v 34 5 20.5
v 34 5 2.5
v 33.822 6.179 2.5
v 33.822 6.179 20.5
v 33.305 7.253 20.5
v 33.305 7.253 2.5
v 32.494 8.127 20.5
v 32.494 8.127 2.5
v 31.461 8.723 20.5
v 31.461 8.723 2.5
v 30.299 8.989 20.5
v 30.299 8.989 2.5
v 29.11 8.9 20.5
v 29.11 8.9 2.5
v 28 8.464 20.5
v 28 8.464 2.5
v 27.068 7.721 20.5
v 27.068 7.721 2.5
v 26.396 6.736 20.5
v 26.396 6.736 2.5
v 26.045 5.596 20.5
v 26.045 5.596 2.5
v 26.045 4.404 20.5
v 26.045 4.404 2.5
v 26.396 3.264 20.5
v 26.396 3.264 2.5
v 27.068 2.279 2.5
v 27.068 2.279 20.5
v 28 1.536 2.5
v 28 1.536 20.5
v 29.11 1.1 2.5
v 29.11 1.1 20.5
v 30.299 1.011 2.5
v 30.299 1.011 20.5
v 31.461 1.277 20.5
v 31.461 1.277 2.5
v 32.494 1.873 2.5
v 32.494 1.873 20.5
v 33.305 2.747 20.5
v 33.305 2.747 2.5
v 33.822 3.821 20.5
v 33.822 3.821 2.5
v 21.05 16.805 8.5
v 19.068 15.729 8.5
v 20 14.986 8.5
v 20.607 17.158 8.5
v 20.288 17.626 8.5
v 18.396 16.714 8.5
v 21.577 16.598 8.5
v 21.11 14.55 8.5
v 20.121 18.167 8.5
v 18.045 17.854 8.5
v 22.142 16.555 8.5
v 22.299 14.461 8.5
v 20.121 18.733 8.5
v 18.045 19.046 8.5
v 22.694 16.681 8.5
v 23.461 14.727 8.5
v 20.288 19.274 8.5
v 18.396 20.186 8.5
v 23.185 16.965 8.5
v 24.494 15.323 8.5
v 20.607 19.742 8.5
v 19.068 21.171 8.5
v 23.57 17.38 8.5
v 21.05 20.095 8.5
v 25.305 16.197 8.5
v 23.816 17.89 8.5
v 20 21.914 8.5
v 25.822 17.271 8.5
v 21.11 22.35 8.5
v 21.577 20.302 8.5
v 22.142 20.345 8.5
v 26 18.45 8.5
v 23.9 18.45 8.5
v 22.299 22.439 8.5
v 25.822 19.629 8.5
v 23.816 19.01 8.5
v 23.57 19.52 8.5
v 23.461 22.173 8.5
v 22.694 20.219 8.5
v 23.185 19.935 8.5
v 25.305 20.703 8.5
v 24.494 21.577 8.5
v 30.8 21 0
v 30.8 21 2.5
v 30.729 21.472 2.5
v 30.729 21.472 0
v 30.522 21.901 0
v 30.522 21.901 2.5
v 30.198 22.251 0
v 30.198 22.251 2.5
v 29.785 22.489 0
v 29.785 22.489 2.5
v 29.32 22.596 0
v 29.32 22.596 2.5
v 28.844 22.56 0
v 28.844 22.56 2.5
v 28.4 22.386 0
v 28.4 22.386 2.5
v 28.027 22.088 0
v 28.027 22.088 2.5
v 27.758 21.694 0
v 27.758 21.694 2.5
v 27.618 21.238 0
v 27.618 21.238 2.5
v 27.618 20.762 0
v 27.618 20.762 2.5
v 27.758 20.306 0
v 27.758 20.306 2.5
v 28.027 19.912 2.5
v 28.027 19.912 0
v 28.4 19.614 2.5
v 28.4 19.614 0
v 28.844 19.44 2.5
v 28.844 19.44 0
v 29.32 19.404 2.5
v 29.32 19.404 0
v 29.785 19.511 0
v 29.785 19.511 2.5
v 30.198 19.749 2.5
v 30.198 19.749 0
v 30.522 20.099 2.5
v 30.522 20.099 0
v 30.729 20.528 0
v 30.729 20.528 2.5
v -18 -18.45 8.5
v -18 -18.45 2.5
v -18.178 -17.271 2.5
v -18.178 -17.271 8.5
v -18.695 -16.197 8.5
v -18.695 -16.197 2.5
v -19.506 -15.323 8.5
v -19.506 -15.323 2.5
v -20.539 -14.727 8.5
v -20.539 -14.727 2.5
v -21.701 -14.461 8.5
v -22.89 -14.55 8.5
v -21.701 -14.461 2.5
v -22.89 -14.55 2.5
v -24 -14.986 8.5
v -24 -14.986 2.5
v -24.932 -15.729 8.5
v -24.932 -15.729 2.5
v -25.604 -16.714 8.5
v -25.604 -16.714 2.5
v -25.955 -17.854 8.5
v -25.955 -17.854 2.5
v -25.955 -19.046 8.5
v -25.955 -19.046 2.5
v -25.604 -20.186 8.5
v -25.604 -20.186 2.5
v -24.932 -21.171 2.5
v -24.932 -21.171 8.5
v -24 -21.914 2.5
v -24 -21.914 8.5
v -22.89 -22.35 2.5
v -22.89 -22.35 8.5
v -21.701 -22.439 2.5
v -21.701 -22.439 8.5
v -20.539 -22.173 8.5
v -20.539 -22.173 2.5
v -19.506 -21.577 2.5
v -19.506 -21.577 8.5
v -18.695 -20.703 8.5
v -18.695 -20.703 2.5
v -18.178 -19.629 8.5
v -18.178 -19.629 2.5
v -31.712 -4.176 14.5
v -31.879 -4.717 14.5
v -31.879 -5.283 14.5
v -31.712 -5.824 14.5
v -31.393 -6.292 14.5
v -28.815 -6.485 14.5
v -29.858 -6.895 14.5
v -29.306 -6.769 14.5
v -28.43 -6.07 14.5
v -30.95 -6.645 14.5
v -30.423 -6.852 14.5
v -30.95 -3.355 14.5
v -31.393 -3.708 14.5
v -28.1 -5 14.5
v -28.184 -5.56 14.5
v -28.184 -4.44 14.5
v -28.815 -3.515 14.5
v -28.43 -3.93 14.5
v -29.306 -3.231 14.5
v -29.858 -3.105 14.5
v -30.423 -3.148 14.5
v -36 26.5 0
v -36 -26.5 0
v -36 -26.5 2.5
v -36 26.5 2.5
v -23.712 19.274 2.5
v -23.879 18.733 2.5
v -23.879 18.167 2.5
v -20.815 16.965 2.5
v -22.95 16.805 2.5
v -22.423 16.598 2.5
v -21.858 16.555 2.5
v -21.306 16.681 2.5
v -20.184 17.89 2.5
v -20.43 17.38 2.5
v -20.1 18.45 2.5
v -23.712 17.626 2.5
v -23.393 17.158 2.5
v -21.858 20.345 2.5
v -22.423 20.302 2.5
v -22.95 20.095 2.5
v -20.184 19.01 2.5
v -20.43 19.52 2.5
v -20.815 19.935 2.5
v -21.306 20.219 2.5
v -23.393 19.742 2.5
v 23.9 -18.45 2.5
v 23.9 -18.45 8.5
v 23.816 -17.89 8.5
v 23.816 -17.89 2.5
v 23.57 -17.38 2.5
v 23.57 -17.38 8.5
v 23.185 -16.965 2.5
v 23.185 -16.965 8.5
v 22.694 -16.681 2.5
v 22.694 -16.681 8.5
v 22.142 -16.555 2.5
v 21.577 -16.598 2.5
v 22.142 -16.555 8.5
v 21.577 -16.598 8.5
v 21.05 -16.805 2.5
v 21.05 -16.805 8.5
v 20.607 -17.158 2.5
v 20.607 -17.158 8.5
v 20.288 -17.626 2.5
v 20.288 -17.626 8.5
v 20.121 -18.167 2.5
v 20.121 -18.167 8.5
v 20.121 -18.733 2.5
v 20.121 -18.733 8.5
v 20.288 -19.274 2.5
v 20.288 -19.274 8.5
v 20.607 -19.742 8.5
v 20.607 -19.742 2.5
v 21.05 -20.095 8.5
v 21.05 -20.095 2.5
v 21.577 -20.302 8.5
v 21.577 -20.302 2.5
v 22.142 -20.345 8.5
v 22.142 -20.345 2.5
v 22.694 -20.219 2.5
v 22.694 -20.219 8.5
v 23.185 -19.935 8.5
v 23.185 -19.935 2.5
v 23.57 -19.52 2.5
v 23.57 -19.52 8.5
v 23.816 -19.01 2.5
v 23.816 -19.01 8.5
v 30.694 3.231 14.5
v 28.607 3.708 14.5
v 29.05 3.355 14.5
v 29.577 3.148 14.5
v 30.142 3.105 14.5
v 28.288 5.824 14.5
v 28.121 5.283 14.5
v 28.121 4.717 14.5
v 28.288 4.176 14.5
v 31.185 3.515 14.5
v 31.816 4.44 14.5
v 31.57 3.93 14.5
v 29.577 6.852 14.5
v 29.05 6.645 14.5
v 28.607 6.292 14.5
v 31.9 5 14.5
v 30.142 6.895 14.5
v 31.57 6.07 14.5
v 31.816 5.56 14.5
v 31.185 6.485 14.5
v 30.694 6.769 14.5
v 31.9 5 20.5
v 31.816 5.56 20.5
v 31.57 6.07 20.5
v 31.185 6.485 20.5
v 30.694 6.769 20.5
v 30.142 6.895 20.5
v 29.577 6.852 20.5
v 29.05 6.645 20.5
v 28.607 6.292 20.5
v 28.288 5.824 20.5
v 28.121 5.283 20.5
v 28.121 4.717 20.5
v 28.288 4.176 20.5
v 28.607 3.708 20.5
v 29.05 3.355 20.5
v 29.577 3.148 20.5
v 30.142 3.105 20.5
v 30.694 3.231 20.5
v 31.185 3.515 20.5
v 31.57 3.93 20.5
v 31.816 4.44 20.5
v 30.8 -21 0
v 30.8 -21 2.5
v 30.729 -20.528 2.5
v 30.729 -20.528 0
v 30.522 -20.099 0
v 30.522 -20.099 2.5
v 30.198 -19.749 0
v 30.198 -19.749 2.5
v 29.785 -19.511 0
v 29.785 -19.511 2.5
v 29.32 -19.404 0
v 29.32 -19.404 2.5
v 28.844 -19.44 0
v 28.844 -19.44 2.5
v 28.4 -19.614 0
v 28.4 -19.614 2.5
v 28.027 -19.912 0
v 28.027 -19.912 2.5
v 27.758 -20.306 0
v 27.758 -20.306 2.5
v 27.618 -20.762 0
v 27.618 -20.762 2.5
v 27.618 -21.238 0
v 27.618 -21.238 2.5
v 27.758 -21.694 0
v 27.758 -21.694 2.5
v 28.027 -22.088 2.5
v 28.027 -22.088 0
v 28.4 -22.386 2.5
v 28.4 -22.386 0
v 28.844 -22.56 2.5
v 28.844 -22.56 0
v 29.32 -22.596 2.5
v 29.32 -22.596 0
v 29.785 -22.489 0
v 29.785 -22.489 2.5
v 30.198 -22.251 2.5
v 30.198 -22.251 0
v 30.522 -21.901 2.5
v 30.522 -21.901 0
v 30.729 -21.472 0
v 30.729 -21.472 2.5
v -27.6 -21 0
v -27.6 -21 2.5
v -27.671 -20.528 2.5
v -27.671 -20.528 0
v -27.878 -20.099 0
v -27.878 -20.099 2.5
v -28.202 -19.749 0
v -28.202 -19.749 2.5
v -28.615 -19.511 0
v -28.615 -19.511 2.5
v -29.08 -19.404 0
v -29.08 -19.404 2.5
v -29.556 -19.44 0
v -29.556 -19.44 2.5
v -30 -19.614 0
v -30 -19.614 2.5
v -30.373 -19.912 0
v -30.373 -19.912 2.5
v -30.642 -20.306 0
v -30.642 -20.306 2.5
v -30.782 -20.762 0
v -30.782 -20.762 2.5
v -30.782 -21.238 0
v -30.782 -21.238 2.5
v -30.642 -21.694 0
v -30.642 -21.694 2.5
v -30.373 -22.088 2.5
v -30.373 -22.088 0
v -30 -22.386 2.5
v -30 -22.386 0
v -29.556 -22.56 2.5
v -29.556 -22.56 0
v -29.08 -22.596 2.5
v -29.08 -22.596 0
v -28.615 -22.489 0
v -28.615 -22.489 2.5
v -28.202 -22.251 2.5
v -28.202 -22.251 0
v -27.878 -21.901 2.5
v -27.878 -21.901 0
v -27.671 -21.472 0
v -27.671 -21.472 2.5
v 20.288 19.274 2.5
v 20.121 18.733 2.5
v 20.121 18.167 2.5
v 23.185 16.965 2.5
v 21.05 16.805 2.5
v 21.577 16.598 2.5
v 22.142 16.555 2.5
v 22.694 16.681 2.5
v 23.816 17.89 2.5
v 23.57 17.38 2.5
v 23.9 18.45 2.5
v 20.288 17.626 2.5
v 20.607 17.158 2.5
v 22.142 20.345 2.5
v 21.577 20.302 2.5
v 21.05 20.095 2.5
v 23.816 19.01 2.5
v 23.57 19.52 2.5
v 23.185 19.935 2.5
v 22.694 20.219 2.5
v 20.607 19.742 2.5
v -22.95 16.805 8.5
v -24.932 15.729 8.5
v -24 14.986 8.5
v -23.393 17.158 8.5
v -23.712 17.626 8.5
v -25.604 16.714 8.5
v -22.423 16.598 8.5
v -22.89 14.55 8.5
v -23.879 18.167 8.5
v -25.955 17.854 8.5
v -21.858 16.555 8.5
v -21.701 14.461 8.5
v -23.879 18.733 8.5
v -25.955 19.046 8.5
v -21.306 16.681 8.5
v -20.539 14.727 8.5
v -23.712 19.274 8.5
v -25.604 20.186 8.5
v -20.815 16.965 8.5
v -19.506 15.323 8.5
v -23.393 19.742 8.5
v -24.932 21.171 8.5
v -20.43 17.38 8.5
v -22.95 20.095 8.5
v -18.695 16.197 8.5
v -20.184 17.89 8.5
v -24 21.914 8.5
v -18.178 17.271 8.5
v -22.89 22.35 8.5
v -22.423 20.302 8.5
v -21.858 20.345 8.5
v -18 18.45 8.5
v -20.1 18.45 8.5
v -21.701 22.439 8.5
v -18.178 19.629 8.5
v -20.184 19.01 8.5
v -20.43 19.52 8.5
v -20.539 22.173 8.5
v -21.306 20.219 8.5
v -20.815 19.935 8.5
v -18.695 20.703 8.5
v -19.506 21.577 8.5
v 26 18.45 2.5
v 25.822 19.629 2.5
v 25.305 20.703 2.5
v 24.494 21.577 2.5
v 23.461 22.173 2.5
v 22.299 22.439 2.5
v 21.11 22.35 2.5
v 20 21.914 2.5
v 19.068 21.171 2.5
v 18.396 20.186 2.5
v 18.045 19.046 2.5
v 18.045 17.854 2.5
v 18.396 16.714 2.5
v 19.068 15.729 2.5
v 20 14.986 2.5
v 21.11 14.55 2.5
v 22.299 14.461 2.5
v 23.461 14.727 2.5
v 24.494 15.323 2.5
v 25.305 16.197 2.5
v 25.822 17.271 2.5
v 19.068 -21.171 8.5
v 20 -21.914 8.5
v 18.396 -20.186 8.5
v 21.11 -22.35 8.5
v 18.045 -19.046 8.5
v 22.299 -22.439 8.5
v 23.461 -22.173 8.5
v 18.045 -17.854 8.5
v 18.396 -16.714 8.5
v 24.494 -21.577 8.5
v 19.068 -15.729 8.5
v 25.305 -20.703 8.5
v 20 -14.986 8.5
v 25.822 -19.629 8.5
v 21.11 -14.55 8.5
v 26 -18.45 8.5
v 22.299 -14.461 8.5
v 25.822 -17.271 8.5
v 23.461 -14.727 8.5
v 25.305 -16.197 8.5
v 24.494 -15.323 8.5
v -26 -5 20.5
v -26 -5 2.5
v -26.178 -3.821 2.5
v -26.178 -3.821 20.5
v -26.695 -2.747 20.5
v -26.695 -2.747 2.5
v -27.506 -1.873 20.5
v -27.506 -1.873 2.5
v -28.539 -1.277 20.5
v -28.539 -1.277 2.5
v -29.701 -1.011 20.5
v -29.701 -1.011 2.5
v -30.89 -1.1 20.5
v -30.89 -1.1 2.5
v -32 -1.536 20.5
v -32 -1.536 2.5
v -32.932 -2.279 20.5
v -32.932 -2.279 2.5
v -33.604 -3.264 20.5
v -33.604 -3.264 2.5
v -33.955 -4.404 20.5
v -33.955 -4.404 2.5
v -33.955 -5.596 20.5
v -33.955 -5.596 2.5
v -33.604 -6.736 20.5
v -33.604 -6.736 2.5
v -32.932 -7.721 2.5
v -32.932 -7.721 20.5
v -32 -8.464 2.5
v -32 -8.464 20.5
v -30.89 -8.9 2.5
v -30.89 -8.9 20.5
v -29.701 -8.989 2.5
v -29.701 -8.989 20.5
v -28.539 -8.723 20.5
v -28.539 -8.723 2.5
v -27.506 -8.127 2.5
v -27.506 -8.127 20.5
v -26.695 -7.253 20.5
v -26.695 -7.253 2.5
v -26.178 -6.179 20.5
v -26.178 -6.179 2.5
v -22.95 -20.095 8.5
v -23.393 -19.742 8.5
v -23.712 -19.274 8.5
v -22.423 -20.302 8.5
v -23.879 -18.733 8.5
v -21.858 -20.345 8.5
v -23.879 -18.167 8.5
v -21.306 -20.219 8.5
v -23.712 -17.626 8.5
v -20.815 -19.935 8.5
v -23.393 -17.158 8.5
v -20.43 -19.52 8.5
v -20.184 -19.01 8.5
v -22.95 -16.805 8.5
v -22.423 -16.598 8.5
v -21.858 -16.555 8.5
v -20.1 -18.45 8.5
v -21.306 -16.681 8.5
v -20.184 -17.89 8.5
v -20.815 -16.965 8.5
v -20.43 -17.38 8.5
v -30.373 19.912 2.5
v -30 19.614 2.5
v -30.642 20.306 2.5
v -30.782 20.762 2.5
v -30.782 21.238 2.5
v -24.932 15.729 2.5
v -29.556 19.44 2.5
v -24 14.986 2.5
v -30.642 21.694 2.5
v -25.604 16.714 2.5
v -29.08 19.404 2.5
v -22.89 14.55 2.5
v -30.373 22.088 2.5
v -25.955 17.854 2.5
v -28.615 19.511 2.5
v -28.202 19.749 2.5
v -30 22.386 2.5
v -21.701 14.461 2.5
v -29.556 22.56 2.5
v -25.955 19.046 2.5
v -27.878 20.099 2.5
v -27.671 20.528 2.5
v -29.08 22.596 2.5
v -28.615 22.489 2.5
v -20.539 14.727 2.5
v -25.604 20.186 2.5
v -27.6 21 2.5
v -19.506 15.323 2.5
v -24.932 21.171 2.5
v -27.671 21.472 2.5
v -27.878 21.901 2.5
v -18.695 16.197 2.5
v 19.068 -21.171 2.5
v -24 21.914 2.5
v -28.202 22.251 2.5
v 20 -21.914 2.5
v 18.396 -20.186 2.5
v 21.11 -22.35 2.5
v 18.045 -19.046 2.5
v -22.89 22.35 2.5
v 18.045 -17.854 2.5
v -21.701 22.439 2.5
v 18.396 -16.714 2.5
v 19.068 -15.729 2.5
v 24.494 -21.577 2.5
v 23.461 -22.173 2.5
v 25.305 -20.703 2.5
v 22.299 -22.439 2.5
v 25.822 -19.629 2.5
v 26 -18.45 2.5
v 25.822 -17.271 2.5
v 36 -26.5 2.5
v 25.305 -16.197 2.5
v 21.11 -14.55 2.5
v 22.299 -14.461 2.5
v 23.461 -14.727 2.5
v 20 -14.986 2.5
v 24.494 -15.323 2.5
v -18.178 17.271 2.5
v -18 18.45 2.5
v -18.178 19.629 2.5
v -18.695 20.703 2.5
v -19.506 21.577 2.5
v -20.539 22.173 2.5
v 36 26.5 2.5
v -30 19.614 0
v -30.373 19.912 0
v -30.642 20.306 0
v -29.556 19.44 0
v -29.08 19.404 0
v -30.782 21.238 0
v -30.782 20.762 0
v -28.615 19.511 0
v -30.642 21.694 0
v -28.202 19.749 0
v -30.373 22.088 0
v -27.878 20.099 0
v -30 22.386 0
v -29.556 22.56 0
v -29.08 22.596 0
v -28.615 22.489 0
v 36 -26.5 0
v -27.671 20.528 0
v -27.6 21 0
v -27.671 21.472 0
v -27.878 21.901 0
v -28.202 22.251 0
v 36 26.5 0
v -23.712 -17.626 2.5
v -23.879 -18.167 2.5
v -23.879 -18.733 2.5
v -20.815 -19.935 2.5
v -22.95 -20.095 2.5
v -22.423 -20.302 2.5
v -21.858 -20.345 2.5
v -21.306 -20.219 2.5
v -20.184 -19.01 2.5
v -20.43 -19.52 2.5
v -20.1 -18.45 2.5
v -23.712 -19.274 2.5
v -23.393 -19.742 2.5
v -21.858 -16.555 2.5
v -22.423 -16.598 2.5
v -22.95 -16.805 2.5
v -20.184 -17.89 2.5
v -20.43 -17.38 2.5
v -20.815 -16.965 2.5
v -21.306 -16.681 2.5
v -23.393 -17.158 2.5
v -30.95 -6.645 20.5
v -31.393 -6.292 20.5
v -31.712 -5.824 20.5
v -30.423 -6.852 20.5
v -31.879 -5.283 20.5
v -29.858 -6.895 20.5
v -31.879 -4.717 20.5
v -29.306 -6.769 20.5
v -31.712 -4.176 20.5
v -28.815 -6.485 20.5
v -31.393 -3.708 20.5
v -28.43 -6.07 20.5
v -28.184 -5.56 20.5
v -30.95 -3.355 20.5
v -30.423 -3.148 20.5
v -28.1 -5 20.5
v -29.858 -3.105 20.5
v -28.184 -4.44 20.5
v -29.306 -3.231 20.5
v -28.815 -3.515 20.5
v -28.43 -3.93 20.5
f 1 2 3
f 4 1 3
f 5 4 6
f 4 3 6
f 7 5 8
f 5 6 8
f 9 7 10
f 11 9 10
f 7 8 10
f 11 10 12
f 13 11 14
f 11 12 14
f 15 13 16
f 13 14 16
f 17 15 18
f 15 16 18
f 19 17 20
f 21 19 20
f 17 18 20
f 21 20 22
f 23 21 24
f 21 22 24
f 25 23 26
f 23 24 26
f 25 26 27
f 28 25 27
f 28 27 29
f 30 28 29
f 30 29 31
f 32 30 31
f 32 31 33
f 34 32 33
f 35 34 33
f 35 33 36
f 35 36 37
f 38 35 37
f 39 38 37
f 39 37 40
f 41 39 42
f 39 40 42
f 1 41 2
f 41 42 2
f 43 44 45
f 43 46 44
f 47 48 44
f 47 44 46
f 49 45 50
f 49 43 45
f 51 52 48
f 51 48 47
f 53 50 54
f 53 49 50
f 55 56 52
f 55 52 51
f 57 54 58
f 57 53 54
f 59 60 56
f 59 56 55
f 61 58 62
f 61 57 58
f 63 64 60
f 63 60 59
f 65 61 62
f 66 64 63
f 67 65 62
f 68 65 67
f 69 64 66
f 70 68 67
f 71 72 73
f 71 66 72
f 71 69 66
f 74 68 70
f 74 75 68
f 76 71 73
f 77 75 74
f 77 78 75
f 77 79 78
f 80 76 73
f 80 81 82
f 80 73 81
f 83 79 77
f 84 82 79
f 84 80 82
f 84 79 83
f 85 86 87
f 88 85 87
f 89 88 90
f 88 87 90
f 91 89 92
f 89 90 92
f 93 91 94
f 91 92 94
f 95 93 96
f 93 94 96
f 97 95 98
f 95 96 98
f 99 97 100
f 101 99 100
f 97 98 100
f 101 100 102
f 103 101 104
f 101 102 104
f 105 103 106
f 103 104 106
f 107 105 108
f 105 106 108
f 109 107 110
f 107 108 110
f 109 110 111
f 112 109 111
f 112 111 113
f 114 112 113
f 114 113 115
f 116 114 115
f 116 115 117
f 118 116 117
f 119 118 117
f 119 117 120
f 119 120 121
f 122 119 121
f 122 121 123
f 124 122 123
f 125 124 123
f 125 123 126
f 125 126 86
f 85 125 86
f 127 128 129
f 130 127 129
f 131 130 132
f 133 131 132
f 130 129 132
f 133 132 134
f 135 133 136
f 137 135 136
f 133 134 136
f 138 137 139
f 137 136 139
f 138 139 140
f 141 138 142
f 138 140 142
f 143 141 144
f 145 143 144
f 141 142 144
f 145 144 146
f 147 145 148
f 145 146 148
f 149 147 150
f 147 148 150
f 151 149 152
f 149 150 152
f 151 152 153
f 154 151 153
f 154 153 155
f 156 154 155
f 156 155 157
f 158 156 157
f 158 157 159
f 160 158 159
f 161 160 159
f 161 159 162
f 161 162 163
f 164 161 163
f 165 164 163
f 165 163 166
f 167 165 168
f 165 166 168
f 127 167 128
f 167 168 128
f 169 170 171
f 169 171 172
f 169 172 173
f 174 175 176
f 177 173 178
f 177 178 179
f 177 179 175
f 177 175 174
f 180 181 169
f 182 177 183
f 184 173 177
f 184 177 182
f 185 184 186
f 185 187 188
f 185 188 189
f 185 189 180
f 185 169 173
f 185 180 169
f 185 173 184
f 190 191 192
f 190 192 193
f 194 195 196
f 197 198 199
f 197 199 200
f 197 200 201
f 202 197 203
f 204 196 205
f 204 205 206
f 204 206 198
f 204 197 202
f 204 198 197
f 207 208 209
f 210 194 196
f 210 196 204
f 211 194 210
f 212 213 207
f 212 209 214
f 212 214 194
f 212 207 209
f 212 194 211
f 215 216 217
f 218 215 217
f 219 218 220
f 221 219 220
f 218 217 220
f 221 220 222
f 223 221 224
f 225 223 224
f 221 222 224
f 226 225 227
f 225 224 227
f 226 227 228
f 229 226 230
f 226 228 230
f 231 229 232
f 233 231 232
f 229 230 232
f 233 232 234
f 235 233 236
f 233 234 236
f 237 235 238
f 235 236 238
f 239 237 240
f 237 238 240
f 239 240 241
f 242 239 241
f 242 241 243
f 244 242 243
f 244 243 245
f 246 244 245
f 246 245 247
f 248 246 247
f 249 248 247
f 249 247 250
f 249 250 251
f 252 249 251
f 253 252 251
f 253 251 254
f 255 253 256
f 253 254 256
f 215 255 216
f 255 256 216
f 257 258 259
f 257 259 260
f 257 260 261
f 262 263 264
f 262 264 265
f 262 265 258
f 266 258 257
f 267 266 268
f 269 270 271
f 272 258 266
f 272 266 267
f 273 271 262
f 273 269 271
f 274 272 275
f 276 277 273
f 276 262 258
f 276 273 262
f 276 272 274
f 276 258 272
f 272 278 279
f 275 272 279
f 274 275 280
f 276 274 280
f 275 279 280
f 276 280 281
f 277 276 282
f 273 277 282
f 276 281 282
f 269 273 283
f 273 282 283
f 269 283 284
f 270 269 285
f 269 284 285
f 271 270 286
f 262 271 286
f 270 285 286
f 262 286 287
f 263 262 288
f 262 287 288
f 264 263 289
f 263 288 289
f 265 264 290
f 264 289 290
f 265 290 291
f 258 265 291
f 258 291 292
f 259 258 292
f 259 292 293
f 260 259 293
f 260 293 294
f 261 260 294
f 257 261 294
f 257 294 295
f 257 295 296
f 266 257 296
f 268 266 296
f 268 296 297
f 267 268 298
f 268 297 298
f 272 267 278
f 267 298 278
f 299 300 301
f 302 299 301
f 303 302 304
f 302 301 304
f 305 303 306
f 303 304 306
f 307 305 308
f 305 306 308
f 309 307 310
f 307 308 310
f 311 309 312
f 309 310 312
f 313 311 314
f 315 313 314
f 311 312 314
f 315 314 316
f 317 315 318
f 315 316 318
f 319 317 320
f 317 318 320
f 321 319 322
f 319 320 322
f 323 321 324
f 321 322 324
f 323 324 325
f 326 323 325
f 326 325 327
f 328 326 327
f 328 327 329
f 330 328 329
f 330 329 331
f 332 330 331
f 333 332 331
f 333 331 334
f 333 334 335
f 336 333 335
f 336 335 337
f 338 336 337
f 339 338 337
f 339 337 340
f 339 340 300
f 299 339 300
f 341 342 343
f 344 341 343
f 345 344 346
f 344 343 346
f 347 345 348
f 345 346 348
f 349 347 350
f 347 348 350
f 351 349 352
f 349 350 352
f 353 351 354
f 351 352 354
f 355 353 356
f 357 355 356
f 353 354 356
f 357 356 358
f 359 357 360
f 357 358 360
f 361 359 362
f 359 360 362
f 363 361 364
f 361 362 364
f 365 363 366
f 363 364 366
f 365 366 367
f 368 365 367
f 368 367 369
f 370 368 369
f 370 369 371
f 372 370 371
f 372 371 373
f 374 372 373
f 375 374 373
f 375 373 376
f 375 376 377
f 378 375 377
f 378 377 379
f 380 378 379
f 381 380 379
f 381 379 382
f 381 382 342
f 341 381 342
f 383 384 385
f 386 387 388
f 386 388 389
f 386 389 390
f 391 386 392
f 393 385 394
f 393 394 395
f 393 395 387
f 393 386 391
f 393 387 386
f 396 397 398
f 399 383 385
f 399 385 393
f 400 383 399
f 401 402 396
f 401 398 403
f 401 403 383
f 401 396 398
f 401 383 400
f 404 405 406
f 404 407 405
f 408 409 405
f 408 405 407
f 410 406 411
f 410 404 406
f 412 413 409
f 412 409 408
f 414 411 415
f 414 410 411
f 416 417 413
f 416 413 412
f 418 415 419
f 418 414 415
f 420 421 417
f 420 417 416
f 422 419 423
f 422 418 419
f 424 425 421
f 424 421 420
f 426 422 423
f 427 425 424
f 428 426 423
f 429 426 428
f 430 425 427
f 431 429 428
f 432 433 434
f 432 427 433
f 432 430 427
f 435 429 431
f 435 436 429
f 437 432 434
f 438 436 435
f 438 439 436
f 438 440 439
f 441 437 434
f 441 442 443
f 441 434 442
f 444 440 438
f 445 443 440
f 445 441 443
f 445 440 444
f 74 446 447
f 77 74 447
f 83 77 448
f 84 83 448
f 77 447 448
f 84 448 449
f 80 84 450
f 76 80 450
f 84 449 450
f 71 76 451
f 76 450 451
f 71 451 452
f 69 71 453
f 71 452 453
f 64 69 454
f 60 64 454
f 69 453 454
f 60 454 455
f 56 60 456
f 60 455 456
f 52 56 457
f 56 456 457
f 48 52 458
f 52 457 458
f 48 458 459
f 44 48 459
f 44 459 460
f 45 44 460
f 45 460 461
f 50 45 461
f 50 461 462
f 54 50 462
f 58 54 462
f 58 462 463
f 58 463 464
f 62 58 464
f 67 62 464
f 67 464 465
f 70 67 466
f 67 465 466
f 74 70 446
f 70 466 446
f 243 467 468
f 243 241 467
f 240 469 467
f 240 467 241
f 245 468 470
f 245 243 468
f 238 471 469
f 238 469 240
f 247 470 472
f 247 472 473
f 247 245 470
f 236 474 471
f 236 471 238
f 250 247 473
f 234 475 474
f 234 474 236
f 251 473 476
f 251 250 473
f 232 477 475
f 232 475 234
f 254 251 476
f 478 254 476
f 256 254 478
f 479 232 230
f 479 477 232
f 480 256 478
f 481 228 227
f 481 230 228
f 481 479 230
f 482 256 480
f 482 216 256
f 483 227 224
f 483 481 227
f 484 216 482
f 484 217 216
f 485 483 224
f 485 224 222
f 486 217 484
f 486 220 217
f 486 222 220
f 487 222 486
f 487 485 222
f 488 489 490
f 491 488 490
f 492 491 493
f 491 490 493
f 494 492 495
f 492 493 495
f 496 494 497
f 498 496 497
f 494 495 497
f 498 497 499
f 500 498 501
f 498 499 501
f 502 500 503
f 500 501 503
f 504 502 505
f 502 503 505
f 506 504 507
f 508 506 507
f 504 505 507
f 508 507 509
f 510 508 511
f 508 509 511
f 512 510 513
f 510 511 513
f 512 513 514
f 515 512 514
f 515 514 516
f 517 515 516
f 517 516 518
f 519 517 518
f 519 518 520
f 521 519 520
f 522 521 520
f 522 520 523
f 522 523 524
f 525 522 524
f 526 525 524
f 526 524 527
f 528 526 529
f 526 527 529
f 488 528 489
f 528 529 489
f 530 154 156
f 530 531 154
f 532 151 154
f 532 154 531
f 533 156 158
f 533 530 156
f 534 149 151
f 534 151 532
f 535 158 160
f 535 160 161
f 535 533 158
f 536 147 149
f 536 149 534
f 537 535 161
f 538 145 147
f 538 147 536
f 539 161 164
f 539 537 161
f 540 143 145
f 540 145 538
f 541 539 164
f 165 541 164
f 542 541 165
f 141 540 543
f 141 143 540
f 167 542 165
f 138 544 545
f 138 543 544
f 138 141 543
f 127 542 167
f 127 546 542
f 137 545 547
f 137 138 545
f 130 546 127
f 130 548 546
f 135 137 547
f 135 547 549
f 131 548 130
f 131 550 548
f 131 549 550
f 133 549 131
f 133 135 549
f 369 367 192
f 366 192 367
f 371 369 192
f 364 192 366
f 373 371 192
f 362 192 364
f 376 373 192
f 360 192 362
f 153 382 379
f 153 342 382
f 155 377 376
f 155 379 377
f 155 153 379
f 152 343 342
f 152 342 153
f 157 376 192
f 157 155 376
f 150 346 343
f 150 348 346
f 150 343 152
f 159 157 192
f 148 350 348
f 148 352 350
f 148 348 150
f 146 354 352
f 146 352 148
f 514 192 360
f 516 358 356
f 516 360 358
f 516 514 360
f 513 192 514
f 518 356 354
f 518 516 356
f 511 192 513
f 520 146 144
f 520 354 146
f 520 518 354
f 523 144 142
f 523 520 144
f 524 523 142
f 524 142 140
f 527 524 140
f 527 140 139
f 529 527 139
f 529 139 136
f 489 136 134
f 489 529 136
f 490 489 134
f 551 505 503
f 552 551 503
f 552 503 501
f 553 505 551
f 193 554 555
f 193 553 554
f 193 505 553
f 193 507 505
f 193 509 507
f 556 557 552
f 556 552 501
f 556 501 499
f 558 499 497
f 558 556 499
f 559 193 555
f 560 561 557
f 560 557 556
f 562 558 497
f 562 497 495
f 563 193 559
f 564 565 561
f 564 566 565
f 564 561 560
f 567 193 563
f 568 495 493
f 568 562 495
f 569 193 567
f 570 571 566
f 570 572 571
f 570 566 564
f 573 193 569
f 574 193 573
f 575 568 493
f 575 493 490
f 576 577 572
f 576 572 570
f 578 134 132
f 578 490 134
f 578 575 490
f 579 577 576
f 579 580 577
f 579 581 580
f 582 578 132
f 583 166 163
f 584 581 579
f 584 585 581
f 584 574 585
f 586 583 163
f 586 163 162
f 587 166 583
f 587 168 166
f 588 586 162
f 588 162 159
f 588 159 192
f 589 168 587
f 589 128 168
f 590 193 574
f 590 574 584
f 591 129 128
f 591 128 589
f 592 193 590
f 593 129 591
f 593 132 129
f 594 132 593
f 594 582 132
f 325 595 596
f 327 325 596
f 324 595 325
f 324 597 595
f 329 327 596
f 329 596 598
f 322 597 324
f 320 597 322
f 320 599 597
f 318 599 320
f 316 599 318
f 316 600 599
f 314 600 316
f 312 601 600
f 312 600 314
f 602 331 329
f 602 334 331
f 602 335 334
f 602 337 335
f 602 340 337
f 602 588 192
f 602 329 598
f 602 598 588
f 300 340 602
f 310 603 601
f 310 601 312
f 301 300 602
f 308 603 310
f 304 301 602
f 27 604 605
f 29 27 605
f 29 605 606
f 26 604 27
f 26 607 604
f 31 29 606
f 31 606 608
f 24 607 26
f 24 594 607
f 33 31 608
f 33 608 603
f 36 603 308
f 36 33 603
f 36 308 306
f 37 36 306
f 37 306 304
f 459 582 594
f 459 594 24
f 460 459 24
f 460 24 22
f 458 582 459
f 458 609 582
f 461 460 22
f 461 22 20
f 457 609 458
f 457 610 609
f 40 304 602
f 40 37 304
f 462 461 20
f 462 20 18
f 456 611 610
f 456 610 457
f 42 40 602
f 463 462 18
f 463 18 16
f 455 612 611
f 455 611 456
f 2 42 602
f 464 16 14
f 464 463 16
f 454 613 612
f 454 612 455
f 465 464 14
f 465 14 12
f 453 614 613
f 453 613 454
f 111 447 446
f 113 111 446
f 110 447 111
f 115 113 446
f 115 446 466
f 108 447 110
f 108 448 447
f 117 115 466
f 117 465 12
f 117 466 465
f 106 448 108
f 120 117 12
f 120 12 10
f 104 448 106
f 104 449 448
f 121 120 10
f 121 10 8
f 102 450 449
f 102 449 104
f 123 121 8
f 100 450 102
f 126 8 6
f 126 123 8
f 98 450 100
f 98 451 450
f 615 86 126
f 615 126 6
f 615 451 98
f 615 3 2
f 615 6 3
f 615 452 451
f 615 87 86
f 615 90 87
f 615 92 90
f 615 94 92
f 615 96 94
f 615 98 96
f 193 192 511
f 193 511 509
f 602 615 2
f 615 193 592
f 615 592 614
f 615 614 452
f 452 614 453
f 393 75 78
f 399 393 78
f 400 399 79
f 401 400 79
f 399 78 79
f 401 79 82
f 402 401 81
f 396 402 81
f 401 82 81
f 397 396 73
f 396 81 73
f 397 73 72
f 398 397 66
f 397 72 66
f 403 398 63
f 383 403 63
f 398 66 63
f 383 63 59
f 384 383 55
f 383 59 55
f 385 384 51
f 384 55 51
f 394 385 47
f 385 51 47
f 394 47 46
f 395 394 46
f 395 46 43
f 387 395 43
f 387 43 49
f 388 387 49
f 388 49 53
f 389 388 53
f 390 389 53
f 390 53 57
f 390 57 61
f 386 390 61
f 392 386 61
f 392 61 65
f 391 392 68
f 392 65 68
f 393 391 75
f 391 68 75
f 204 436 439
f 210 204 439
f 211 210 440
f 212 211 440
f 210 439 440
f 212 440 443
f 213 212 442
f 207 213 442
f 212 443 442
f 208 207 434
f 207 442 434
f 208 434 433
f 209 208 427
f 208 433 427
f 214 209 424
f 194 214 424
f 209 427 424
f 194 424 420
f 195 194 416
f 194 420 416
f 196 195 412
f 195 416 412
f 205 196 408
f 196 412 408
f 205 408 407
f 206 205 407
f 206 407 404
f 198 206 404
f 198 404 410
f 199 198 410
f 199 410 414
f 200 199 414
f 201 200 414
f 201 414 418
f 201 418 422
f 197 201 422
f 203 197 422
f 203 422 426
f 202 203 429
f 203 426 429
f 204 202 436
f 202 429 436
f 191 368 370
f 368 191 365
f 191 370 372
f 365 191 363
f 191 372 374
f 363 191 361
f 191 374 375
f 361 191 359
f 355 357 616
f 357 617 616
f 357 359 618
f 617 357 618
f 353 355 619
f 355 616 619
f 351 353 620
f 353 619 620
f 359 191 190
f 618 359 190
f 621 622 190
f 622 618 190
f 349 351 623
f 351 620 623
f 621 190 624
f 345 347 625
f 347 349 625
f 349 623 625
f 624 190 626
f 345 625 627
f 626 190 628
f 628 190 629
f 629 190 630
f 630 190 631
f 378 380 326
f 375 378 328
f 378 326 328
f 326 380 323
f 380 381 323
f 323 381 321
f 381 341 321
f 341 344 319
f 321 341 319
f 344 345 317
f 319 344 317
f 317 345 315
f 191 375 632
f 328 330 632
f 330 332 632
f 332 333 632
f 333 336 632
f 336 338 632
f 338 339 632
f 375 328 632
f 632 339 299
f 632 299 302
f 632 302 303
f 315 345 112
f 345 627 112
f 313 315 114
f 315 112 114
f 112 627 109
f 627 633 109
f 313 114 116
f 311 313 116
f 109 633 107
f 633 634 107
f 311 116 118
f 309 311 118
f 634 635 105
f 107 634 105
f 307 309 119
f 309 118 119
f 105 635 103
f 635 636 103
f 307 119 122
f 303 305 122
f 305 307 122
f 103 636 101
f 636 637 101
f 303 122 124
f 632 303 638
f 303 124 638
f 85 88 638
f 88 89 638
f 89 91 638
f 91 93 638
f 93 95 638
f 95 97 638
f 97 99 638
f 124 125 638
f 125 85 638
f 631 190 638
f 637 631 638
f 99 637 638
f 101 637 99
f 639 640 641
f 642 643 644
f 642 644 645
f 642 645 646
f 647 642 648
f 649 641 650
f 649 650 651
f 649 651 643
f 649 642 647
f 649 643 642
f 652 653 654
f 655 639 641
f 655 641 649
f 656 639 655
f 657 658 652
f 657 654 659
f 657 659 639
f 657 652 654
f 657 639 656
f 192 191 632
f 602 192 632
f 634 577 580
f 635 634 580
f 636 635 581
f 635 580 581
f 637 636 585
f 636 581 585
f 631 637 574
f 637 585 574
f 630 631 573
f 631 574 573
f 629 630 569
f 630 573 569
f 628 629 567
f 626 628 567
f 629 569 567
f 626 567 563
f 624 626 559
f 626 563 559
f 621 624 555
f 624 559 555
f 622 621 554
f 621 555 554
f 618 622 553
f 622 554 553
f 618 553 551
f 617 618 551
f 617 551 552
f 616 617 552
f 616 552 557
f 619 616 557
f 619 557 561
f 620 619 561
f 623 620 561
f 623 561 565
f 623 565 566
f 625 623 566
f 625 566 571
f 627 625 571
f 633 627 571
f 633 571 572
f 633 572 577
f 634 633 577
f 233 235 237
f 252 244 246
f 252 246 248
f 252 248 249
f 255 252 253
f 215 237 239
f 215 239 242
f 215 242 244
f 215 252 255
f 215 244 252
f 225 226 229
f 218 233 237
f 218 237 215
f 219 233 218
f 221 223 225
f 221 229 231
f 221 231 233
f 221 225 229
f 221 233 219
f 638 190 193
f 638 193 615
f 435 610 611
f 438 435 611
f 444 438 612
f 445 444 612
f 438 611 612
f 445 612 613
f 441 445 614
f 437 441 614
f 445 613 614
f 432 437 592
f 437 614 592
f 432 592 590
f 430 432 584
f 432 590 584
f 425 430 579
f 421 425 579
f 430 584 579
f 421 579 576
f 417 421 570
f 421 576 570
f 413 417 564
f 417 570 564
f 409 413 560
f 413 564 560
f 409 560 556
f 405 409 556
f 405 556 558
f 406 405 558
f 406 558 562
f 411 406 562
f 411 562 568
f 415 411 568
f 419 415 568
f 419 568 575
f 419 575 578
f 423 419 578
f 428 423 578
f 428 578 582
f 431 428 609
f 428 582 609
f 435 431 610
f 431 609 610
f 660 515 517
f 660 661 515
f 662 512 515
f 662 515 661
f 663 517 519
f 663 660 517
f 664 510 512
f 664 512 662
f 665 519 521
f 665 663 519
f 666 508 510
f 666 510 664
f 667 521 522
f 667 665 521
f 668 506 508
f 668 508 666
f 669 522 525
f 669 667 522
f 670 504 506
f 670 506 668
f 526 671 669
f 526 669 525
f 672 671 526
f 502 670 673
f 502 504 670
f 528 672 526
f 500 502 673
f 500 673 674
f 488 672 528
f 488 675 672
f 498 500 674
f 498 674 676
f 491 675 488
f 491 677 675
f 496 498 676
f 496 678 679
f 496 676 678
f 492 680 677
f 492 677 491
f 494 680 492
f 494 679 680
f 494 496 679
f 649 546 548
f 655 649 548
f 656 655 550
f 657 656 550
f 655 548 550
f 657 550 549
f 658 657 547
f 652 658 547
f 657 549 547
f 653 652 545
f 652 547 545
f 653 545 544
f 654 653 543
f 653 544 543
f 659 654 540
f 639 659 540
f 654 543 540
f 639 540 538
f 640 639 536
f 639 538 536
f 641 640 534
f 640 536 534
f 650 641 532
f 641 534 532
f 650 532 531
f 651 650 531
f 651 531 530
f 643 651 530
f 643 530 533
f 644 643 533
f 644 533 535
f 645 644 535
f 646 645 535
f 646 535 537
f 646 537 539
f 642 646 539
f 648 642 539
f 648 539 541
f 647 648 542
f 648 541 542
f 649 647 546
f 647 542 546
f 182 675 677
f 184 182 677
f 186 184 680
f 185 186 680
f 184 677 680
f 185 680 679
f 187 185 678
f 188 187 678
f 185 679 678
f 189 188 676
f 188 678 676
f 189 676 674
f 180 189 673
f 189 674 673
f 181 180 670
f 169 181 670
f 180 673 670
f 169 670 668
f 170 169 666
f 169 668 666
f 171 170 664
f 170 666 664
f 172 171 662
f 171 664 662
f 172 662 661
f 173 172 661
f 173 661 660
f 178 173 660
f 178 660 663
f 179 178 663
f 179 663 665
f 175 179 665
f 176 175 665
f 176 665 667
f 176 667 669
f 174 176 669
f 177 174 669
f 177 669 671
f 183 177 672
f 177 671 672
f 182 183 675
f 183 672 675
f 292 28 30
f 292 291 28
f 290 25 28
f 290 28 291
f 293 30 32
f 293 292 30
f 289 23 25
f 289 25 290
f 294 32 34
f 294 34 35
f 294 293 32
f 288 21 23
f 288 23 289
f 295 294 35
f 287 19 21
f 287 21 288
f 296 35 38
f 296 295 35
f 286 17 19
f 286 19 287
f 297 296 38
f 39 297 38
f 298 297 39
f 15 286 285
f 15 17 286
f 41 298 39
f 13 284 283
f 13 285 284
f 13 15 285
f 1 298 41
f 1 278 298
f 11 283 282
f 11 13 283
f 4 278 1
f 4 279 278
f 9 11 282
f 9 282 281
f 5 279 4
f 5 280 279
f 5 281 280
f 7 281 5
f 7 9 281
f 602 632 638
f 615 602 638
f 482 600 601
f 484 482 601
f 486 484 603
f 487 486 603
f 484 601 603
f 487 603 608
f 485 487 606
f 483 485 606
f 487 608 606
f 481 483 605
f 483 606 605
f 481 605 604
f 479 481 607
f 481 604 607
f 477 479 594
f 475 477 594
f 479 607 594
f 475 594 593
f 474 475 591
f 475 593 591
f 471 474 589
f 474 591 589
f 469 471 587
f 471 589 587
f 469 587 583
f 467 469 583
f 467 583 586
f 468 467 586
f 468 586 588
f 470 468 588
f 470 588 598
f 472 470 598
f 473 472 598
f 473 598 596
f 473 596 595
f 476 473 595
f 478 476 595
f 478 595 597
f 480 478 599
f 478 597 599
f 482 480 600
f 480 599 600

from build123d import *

# Parameters (mm, degrees)
SKETCH_W      = 72
SKETCH_H      = 53
PAD_DEPTH     = 2.5
SKETCH001_R   = 4
PAD001_DEPTH  = 6
SKETCH002_R   = 1.9
HOLE_DEPTH    = 6
SKETCH003_R   = 1.6
HOLE001_DEPTH = 2.501
SKETCH004_R   = 4
PAD002_DEPTH  = 18
SKETCH005_R   = 1.9
HOLE002_DEPTH = 6


with BuildPart() as part:
    # Sketch → Pad (new body)
    with BuildSketch(Plane.XY):
        Rectangle(SKETCH_W, SKETCH_H)
    extrude(amount=PAD_DEPTH)

    # Sketch001 (on Face6 of Pad) → Pad001 (join)
    with BuildSketch(Plane.XY.offset(2.5)):
        with Locations((-22, 18.45)):
            Circle(SKETCH001_R)
        with Locations((22, 18.45)):
            Circle(SKETCH001_R)
        with Locations((-22, -18.45)):
            Circle(SKETCH001_R)
        with Locations((22, -18.45)):
            Circle(SKETCH001_R)
    extrude(amount=PAD001_DEPTH)

    # Sketch002 (on Face14 of Pad001) → Hole (cut)
    with BuildSketch(Plane.XY.offset(8.5)):
        with Locations((-22, 18.45)):
            Circle(SKETCH002_R)
        with Locations((22, 18.45)):
            Circle(SKETCH002_R)
        with Locations((-22, -18.45)):
            Circle(SKETCH002_R)
        with Locations((22, -18.45)):
            Circle(SKETCH002_R)
    extrude(amount=-HOLE_DEPTH, mode=Mode.SUBTRACT)

    # Sketch003 (on Face5 of Hole) → Hole001 (cut, through all)
    with BuildSketch(Plane.XY.offset(2.5)):
        with Locations((-29.2, 21)):
            Circle(SKETCH003_R)
        with Locations((-29.2, -21)):
            Circle(SKETCH003_R)
        with Locations((29.2, 21)):
            Circle(SKETCH003_R)
        with Locations((29.2, -21)):
            Circle(SKETCH003_R)
    extrude(amount=-HOLE001_DEPTH, mode=Mode.SUBTRACT)

    # Sketch004 (on Face5 of Hole001) → Pad002 (join)
    with BuildSketch(Plane.XY.offset(2.5)):
        with Locations((30, 5)):
            Circle(SKETCH004_R)
        with Locations((-30, -5)):
            Circle(SKETCH004_R)
    extrude(amount=PAD002_DEPTH)

    # Sketch005 (on Face19 of Pad002) → Hole002 (cut)
    with BuildSketch(Plane.XY.offset(20.5)):
        with Locations((-30, -5)):
            Circle(SKETCH005_R)
        with Locations((30, 5)):
            Circle(SKETCH005_R)
    extrude(amount=-HOLE002_DEPTH, mode=Mode.SUBTRACT)


solid = part.part
